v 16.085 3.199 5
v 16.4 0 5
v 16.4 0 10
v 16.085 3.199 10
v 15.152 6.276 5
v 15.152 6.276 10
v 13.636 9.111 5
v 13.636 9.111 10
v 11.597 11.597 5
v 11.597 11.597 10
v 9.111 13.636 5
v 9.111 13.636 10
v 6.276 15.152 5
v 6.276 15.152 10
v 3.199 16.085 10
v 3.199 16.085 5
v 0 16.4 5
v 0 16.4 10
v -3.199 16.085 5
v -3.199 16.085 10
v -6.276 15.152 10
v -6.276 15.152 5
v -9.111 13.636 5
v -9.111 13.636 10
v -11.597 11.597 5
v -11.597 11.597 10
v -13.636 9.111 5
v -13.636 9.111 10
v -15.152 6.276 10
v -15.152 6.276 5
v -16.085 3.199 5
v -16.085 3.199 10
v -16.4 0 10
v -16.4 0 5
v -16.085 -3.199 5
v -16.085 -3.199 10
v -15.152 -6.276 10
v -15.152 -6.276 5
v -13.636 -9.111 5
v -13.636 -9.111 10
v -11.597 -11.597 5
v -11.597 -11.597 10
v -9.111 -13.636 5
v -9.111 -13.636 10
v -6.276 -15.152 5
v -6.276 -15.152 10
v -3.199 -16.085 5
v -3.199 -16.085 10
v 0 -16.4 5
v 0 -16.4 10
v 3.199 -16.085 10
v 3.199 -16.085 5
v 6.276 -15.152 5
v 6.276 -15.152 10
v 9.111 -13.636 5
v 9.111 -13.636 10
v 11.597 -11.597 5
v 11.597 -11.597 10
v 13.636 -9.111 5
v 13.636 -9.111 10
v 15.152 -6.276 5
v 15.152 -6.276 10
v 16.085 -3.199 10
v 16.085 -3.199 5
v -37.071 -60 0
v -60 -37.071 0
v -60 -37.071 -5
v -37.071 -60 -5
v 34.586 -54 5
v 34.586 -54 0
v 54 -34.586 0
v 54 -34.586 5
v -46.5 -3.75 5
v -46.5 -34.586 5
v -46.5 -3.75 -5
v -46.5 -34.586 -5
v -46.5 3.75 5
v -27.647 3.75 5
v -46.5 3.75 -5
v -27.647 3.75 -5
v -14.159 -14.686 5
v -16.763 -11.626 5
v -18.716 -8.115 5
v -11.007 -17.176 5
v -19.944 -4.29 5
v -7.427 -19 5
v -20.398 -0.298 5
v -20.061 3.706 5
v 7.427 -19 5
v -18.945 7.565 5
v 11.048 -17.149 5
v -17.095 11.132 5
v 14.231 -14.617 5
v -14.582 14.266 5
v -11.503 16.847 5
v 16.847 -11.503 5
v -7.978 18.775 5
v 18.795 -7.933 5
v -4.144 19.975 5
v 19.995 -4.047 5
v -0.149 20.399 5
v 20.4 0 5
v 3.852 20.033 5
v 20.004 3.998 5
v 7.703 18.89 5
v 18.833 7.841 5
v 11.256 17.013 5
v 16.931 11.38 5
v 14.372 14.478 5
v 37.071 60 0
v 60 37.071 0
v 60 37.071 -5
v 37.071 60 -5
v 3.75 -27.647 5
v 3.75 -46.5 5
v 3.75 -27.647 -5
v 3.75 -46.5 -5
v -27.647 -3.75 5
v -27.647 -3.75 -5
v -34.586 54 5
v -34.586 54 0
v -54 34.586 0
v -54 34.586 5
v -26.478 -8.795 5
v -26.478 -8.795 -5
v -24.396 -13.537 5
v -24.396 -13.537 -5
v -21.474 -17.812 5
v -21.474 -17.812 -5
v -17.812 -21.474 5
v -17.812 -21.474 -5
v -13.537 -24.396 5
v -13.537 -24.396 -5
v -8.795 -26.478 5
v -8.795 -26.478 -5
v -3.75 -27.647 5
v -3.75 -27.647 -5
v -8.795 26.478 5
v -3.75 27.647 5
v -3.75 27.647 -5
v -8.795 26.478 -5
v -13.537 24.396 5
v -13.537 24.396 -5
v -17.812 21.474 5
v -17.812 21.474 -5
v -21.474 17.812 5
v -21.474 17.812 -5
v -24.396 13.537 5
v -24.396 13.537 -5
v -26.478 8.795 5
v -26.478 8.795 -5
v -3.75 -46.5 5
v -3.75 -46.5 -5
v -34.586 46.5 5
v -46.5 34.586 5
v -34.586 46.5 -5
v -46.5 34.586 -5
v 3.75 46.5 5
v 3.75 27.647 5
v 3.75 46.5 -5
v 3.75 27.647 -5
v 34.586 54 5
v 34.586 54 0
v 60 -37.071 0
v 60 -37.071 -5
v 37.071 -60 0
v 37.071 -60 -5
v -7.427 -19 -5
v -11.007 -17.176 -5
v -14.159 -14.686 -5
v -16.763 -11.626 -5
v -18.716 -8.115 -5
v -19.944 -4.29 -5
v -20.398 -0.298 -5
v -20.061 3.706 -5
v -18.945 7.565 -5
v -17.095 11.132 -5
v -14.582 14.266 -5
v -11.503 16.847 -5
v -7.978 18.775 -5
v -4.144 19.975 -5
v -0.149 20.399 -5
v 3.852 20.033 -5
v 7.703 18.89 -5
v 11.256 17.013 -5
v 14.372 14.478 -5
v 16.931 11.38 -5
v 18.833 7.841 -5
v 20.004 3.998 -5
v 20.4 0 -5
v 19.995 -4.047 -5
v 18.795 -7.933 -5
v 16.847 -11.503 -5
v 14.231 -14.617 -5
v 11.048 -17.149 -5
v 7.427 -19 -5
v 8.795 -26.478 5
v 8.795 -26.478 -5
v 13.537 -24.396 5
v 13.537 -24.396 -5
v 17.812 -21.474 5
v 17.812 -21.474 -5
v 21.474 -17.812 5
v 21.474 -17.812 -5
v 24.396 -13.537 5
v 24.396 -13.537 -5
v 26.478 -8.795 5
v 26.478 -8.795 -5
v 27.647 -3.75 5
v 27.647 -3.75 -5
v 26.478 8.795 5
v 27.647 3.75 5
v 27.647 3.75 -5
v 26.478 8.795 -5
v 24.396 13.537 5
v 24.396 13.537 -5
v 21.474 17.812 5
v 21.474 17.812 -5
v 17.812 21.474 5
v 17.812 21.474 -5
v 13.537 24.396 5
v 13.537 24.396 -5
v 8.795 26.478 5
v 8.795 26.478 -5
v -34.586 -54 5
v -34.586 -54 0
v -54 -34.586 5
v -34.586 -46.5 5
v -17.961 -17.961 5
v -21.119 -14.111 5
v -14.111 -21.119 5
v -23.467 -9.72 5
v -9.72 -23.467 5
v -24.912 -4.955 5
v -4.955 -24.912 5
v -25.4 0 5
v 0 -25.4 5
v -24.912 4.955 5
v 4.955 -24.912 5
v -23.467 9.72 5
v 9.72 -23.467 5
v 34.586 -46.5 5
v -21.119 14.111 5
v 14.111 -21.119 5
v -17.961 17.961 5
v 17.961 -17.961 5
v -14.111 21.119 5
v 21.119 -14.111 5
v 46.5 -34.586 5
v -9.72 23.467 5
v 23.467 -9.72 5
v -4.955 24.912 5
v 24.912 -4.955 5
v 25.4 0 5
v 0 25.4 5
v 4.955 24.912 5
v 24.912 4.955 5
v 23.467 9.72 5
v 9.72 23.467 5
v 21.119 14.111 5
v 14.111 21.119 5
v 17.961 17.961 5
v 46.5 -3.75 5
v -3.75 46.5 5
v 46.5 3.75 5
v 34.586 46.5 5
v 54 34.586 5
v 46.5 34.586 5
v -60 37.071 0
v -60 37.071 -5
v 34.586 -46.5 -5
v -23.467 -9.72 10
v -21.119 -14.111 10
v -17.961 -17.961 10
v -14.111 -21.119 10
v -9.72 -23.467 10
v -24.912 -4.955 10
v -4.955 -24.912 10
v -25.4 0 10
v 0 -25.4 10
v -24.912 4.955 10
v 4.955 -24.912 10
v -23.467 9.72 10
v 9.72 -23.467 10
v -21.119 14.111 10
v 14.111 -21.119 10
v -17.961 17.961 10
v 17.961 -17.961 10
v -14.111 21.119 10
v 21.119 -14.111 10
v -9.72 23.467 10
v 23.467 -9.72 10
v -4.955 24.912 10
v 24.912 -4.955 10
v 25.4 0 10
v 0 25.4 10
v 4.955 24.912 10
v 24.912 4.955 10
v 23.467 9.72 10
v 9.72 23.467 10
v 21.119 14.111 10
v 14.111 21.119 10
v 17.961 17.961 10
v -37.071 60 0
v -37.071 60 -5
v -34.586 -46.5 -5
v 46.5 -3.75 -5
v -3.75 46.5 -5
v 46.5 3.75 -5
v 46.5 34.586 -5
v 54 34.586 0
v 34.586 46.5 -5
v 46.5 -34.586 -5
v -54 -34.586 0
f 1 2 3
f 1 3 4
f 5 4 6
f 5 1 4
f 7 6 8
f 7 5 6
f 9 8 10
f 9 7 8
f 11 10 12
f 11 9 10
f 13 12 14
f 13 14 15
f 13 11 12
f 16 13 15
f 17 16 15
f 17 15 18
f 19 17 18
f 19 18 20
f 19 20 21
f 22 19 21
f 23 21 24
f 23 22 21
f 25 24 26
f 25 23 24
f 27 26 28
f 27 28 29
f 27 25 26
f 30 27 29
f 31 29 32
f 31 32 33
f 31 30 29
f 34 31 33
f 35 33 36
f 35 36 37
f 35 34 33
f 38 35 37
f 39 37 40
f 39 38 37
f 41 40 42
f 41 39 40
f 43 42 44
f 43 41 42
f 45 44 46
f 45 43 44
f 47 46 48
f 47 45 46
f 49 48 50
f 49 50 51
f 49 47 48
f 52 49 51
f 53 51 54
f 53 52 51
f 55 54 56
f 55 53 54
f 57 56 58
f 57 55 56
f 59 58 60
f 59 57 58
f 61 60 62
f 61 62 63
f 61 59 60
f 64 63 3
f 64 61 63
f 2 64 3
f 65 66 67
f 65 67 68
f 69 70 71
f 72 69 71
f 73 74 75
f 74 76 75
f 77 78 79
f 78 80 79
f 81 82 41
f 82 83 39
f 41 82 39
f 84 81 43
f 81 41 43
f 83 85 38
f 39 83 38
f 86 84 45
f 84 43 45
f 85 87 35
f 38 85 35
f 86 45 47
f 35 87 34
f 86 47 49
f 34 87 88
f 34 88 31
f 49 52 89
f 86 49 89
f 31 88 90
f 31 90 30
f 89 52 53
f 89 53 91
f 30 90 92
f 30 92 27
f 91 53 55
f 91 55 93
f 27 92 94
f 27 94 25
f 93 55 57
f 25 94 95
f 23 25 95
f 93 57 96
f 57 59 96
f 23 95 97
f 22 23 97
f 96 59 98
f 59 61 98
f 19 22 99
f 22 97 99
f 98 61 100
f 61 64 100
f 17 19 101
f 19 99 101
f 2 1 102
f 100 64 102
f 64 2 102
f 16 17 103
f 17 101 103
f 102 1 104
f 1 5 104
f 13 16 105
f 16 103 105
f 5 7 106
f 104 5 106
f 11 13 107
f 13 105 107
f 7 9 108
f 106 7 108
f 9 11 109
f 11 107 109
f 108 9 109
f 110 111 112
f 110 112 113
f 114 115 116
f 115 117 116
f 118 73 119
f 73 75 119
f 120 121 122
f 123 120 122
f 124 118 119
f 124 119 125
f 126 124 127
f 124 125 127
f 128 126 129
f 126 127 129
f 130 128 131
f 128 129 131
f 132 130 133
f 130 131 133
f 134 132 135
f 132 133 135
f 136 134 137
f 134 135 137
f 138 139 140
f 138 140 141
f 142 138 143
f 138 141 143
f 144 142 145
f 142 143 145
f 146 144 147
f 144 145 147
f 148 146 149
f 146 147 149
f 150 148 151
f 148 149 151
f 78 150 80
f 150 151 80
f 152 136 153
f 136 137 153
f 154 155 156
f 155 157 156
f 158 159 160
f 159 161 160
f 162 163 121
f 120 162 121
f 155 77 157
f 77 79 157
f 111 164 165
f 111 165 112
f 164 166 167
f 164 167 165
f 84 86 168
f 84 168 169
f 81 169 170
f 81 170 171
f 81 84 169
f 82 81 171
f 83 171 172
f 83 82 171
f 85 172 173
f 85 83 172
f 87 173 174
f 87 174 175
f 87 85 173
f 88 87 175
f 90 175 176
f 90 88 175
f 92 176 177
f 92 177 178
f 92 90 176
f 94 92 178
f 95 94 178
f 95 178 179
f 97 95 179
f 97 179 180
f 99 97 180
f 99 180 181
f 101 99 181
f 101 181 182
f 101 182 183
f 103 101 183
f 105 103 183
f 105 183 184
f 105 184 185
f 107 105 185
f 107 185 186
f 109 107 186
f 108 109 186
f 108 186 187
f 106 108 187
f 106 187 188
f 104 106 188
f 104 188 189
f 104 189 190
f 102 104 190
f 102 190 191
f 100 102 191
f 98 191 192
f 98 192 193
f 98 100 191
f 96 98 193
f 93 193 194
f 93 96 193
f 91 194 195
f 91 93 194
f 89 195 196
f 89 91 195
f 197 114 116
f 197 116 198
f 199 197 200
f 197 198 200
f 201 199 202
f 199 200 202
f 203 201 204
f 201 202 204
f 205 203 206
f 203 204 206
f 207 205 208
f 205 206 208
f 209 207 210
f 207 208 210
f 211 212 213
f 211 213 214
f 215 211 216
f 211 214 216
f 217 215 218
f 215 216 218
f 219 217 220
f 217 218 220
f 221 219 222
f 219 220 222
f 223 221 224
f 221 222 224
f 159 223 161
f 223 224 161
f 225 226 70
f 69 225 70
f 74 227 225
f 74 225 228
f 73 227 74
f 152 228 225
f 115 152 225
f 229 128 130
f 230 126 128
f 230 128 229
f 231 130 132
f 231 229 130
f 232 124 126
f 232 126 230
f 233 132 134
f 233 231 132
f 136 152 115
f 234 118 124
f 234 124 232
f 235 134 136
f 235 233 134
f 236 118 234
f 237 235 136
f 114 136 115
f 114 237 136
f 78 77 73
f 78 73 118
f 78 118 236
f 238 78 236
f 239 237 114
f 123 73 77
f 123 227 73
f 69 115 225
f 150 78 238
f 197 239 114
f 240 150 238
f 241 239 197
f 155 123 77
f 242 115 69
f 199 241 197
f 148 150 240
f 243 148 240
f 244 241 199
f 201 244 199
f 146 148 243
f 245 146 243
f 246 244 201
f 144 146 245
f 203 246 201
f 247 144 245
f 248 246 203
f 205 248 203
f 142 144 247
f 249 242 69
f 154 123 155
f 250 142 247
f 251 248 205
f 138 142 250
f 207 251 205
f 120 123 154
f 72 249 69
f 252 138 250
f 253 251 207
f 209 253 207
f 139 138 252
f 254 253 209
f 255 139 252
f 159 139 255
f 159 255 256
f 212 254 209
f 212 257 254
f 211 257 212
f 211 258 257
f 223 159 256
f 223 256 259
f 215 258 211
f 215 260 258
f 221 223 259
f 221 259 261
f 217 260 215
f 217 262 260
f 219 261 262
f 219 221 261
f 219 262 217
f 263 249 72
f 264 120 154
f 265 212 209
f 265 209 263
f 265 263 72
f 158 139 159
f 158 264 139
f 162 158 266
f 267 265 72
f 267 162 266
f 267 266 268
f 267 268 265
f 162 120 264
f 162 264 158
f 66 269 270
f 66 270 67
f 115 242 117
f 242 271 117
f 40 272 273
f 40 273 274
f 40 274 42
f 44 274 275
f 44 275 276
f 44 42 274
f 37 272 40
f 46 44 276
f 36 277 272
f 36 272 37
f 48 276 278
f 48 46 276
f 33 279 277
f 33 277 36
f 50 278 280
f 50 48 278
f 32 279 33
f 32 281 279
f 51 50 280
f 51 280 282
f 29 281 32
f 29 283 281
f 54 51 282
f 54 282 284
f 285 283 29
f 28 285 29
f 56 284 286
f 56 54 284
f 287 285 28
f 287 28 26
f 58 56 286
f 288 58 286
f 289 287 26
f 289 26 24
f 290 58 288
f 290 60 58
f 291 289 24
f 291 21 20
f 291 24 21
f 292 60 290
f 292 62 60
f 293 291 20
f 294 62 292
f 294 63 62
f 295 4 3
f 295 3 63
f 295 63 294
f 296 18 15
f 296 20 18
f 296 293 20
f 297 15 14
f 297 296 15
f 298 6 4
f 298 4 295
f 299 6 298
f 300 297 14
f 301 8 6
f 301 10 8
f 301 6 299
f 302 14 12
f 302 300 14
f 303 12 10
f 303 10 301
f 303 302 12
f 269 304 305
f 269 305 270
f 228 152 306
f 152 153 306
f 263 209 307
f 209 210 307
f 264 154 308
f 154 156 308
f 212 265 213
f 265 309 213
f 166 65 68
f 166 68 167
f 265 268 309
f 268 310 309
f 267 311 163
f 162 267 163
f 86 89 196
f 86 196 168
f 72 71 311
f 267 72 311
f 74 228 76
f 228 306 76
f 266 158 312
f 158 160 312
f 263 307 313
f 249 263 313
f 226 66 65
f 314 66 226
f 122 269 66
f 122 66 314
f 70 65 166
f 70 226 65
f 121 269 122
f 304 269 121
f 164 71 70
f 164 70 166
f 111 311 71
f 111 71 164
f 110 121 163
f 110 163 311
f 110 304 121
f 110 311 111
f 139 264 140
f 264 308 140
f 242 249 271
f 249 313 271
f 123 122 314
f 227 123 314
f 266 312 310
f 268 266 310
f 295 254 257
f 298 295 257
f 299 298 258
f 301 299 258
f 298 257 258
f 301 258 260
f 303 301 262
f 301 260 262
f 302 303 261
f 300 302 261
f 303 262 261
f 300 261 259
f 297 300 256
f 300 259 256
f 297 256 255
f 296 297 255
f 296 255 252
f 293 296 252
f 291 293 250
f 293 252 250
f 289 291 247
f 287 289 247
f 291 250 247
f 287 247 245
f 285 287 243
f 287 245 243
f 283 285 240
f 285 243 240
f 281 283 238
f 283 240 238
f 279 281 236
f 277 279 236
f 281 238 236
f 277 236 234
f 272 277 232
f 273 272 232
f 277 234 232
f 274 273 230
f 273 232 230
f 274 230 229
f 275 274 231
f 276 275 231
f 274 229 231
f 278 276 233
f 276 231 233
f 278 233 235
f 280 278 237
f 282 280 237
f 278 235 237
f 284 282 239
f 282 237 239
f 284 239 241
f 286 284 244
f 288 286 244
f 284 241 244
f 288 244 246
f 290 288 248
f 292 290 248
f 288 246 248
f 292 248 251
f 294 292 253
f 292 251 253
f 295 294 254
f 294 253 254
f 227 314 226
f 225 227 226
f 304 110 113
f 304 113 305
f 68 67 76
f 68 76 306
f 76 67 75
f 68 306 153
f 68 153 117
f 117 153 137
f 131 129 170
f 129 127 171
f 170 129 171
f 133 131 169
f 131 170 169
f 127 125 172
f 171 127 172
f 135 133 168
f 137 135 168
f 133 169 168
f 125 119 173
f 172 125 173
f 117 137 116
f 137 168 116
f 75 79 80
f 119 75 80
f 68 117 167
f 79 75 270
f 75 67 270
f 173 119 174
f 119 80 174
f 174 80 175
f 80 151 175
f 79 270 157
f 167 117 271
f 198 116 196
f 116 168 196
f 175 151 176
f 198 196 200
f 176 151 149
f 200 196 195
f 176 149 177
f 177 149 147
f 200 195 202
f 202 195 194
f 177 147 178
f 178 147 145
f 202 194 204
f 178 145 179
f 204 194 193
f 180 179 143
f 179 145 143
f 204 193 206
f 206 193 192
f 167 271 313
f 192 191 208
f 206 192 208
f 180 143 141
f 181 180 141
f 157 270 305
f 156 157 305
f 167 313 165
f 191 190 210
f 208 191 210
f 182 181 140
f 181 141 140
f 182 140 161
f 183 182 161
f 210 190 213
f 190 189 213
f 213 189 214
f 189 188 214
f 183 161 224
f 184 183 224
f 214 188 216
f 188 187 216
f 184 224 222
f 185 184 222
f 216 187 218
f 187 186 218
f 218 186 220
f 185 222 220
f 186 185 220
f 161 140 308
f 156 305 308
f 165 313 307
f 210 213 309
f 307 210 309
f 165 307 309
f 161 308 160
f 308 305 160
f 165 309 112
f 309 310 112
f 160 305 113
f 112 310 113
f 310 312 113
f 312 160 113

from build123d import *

# Parameters (mm, degrees)
F2_DEPTH = 5
F3_DEPTH = 5
F4_R     = 25.4
F4_R_2   = 16.4
F5_DEPTH = 5


with BuildPart() as f2:
    # F1 (on Top) → F2 (new body)
    with BuildSketch(Plane.XY):
        Polygon((34.5857864376, 54), (-34.5857864376, 54), (-54, 34.5857864376), (-54, -34.5857864376), (-34.5857864376, -54), (34.5857864376, -54), (54, -34.5857864376), (54, 34.5857864376), align=None)
        Polygon((46.5, 34.5857864376), (46.5, 3.75), (46.5, -3.75), (46.5, -34.5857864376), (34.5857864376, -46.5), (3.75, -46.5), (-3.75, -46.5), (-34.5857864376, -46.5), (-46.5, -34.5857864376), (-46.5, -3.75), (-46.5, 3.75), (-46.5, 34.5857864376), (-34.5857864376, 46.5), (-3.75, 46.5), (3.75, 46.5), (34.5857864376, 46.5), align=None, mode=Mode.SUBTRACT)
        with BuildLine():
            ThreePointArc((27.6468352619, -3.75), (27.8366368641, -1.8792679682), (27.9, 0))
            ThreePointArc((27.9, 0), (27.8366368641, 1.8792679682), (27.6468352619, 3.75))
            ThreePointArc((27.6468352619, 3.75), (19.7282791951, 19.7282791951), (3.75, 27.6468352619))
            ThreePointArc((3.75, 27.6468352619), (0, 27.9), (-3.75, 27.6468352619))
            ThreePointArc((-3.75, 27.6468352619), (-19.7282791951, 19.7282791951), (-27.6468352619, 3.75))
            ThreePointArc((-27.6468352619, 3.75), (-27.9, 0), (-27.6468352619, -3.75))
            ThreePointArc((-27.6468352619, -3.75), (-19.7282791951, -19.7282791951), (-3.75, -27.6468352619))
            ThreePointArc((-3.75, -27.6468352619), (0, -27.9), (3.75, -27.6468352619))
            ThreePointArc((3.75, -27.6468352619), (19.7282791951, -19.7282791951), (27.6468352619, -3.75))
        make_face()
        with BuildLine():
            ThreePointArc((7.4269778511, -19), (0, -20.4), (-7.4269778511, -19))
            ThreePointArc((-7.4269778511, -19), (-11.5032528408, 16.8474085272), (20.4, 0))
            ThreePointArc((20.4, 0), (16.8474085272, -11.5032528408), (7.4269778511, -19))
        make_face(mode=Mode.SUBTRACT)
        Polygon((-42.0710678119, 55), (-35, 55), (35, 55), (42.0710678119, 55), (37.0710678119, 60), (-37.0710678119, 60), align=None)
        Polygon((-55, 35), (-55, 42.0710678119), (-60, 37.0710678119), (-60, -37.0710678119), (-55, -42.0710678119), (-55, -35), align=None)
        Polygon((-42.0710678119, -55), (-37.0710678119, -60), (37.0710678119, -60), (42.0710678119, -55), (35, -55), (-35, -55), align=None)
        Polygon((60, 37.0710678119), (55, 42.0710678119), (55, 35), (55, -35), (55, -42.0710678119), (60, -37.0710678119), align=None)
        with BuildLine():
            ThreePointArc((27.6468352619, 3.75), (27.8366368641, 1.8792679682), (27.9, 0))
            ThreePointArc((27.9, 0), (27.8366368641, -1.8792679682), (27.6468352619, -3.75))
            Line((27.6468352619, -3.75), (46.5, -3.75))
            Line((46.5, -3.75), (46.5, 3.75))
            Line((46.5, 3.75), (27.6468352619, 3.75))
        make_face()
        with BuildLine():
            ThreePointArc((-3.75, 27.6468352619), (0, 27.9), (3.75, 27.6468352619))
            Line((3.75, 27.6468352619), (3.75, 46.5))
            Line((3.75, 46.5), (-3.75, 46.5))
            Line((-3.75, 46.5), (-3.75, 27.6468352619))
        make_face()
        with BuildLine():
            ThreePointArc((-27.6468352619, -3.75), (-27.9, 0), (-27.6468352619, 3.75))
            Line((-27.6468352619, 3.75), (-46.5, 3.75))
            Line((-46.5, 3.75), (-46.5, -3.75))
            Line((-46.5, -3.75), (-27.6468352619, -3.75))
        make_face()
        with BuildLine():
            Line((3.75, -46.5), (3.75, -27.6468352619))
            ThreePointArc((3.75, -27.6468352619), (0, -27.9), (-3.75, -27.6468352619))
            Line((-3.75, -27.6468352619), (-3.75, -46.5))
            Line((-3.75, -46.5), (3.75, -46.5))
        make_face()
        Polygon((-54, 36), (-36, 54), (-43.0710678119, 54), (-54, 43.0710678119), align=None)
        Polygon((-36, -54), (-54, -36), (-54, -43.0710678119), (-43.0710678119, -54), align=None)
        Polygon((54, -43.0710678119), (54, -36), (36, -54), (43.0710678119, -54), align=None)
        Polygon((43.0710678119, 54), (36, 54), (54, 36), (54, 43.0710678119), align=None)
        Polygon((-54, 34.5857864376), (-54, 36), (-55, 35), (-55, -35), (-54, -36), (-54, -34.5857864376), align=None)
        Polygon((34.5857864376, -54), (-34.5857864376, -54), (-36, -54), (-35, -55), (35, -55), (36, -54), align=None)
        Polygon((35, 55), (-35, 55), (-36, 54), (-34.5857864376, 54), (34.5857864376, 54), (36, 54), align=None)
        Polygon((55, 35), (54, 36), (54, 34.5857864376), (54, -34.5857864376), (54, -36), (55, -35), align=None)
        Polygon((-34.5857864376, -54), (-54, -34.5857864376), (-54, -36), (-36, -54), align=None)
        Polygon((-34.5857864376, 54), (-36, 54), (-54, 36), (-54, 34.5857864376), align=None)
        Polygon((54, -36), (54, -34.5857864376), (34.5857864376, -54), (36, -54), align=None)
        Polygon((54, 36), (36, 54), (34.5857864376, 54), (54, 34.5857864376), align=None)
        with BuildLine():
            ThreePointArc((3.9191835885, -19), (0, -19.4), (-3.9191835885, -19))
            Line((-3.9191835885, -19), (-7.4269778511, -19))
            ThreePointArc((-7.4269778511, -19), (0, -20.4), (7.4269778511, -19))
            Line((7.4269778511, -19), (3.9191835885, -19))
        make_face()
        Polygon((-36, 54), (-35, 55), (-42.0710678119, 55), (-43.0710678119, 54), align=None)
        Polygon((-55, 35), (-54, 36), (-54, 43.0710678119), (-55, 42.0710678119), align=None)
        Polygon((-54, -36), (-55, -35), (-55, -42.0710678119), (-54, -43.0710678119), align=None)
        Polygon((-35, -55), (-36, -54), (-43.0710678119, -54), (-42.0710678119, -55), align=None)
        Polygon((55, -42.0710678119), (55, -35), (54, -36), (54, -43.0710678119), align=None)
        Polygon((43.0710678119, -54), (36, -54), (35, -55), (42.0710678119, -55), align=None)
        Polygon((42.0710678119, 55), (35, 55), (36, 54), (43.0710678119, 54), align=None)
        Polygon((54, 43.0710678119), (54, 36), (55, 35), (55, 42.0710678119), align=None)
        with BuildLine():
            Line((3.9191835885, -19), (-3.9191835885, -19))
            ThreePointArc((-3.9191835885, -19), (0, -19.4), (3.9191835885, -19))
        make_face()
    extrude(amount=-F2_DEPTH)

    # F1 (on Top) → F3 (join)
    with BuildSketch(Plane.XY):
        Polygon((34.5857864376, 54), (-34.5857864376, 54), (-54, 34.5857864376), (-54, -34.5857864376), (-34.5857864376, -54), (34.5857864376, -54), (54, -34.5857864376), (54, 34.5857864376), align=None)
        Polygon((46.5, 34.5857864376), (46.5, 3.75), (46.5, -3.75), (46.5, -34.5857864376), (34.5857864376, -46.5), (3.75, -46.5), (-3.75, -46.5), (-34.5857864376, -46.5), (-46.5, -34.5857864376), (-46.5, -3.75), (-46.5, 3.75), (-46.5, 34.5857864376), (-34.5857864376, 46.5), (-3.75, 46.5), (3.75, 46.5), (34.5857864376, 46.5), align=None, mode=Mode.SUBTRACT)
        with BuildLine():
            ThreePointArc((27.6468352619, -3.75), (27.8366368641, -1.8792679682), (27.9, 0))
            ThreePointArc((27.9, 0), (27.8366368641, 1.8792679682), (27.6468352619, 3.75))
            ThreePointArc((27.6468352619, 3.75), (19.7282791951, 19.7282791951), (3.75, 27.6468352619))
            ThreePointArc((3.75, 27.6468352619), (0, 27.9), (-3.75, 27.6468352619))
            ThreePointArc((-3.75, 27.6468352619), (-19.7282791951, 19.7282791951), (-27.6468352619, 3.75))
            ThreePointArc((-27.6468352619, 3.75), (-27.9, 0), (-27.6468352619, -3.75))
            ThreePointArc((-27.6468352619, -3.75), (-19.7282791951, -19.7282791951), (-3.75, -27.6468352619))
            ThreePointArc((-3.75, -27.6468352619), (0, -27.9), (3.75, -27.6468352619))
            ThreePointArc((3.75, -27.6468352619), (19.7282791951, -19.7282791951), (27.6468352619, -3.75))
        make_face()
        with BuildLine():
            ThreePointArc((7.4269778511, -19), (0, -20.4), (-7.4269778511, -19))
            ThreePointArc((-7.4269778511, -19), (-11.5032528408, 16.8474085272), (20.4, 0))
            ThreePointArc((20.4, 0), (16.8474085272, -11.5032528408), (7.4269778511, -19))
        make_face(mode=Mode.SUBTRACT)
        with BuildLine():
            Line((3.75, -46.5), (3.75, -27.6468352619))
            ThreePointArc((3.75, -27.6468352619), (0, -27.9), (-3.75, -27.6468352619))
            Line((-3.75, -27.6468352619), (-3.75, -46.5))
            Line((-3.75, -46.5), (3.75, -46.5))
        make_face()
        with BuildLine():
            ThreePointArc((-27.6468352619, -3.75), (-27.9, 0), (-27.6468352619, 3.75))
            Line((-27.6468352619, 3.75), (-46.5, 3.75))
            Line((-46.5, 3.75), (-46.5, -3.75))
            Line((-46.5, -3.75), (-27.6468352619, -3.75))
        make_face()
        with BuildLine():
            ThreePointArc((27.6468352619, 3.75), (27.8366368641, 1.8792679682), (27.9, 0))
            ThreePointArc((27.9, 0), (27.8366368641, -1.8792679682), (27.6468352619, -3.75))
            Line((27.6468352619, -3.75), (46.5, -3.75))
            Line((46.5, -3.75), (46.5, 3.75))
            Line((46.5, 3.75), (27.6468352619, 3.75))
        make_face()
        with BuildLine():
            ThreePointArc((-3.75, 27.6468352619), (0, 27.9), (3.75, 27.6468352619))
            Line((3.75, 27.6468352619), (3.75, 46.5))
            Line((3.75, 46.5), (-3.75, 46.5))
            Line((-3.75, 46.5), (-3.75, 27.6468352619))
        make_face()
        with BuildLine():
            ThreePointArc((3.9191835885, -19), (0, -19.4), (-3.9191835885, -19))
            Line((-3.9191835885, -19), (-7.4269778511, -19))
            ThreePointArc((-7.4269778511, -19), (0, -20.4), (7.4269778511, -19))
            Line((7.4269778511, -19), (3.9191835885, -19))
        make_face()
        with BuildLine():
            Line((3.9191835885, -19), (-3.9191835885, -19))
            ThreePointArc((-3.9191835885, -19), (0, -19.4), (3.9191835885, -19))
        make_face()
    extrude(amount=F3_DEPTH)

    # F4 (on face) → F5 (join)
    with BuildSketch(Plane.XY.offset(5)):
        Circle(F4_R)
        with BuildLine():
            ThreePointArc((-7.4269778511, -19), (0, 20.4), (7.4269778511, -19))
            Line((7.4269778511, -19), (-7.4269778511, -19))
        make_face(mode=Mode.SUBTRACT)
        with BuildLine():
            Line((-7.4269778511, -19), (7.4269778511, -19))
            ThreePointArc((7.4269778511, -19), (0, 20.4), (-7.4269778511, -19))
        make_face()
        Circle(F4_R_2, mode=Mode.SUBTRACT)
    extrude(amount=F5_DEPTH)


solid = f2.part
